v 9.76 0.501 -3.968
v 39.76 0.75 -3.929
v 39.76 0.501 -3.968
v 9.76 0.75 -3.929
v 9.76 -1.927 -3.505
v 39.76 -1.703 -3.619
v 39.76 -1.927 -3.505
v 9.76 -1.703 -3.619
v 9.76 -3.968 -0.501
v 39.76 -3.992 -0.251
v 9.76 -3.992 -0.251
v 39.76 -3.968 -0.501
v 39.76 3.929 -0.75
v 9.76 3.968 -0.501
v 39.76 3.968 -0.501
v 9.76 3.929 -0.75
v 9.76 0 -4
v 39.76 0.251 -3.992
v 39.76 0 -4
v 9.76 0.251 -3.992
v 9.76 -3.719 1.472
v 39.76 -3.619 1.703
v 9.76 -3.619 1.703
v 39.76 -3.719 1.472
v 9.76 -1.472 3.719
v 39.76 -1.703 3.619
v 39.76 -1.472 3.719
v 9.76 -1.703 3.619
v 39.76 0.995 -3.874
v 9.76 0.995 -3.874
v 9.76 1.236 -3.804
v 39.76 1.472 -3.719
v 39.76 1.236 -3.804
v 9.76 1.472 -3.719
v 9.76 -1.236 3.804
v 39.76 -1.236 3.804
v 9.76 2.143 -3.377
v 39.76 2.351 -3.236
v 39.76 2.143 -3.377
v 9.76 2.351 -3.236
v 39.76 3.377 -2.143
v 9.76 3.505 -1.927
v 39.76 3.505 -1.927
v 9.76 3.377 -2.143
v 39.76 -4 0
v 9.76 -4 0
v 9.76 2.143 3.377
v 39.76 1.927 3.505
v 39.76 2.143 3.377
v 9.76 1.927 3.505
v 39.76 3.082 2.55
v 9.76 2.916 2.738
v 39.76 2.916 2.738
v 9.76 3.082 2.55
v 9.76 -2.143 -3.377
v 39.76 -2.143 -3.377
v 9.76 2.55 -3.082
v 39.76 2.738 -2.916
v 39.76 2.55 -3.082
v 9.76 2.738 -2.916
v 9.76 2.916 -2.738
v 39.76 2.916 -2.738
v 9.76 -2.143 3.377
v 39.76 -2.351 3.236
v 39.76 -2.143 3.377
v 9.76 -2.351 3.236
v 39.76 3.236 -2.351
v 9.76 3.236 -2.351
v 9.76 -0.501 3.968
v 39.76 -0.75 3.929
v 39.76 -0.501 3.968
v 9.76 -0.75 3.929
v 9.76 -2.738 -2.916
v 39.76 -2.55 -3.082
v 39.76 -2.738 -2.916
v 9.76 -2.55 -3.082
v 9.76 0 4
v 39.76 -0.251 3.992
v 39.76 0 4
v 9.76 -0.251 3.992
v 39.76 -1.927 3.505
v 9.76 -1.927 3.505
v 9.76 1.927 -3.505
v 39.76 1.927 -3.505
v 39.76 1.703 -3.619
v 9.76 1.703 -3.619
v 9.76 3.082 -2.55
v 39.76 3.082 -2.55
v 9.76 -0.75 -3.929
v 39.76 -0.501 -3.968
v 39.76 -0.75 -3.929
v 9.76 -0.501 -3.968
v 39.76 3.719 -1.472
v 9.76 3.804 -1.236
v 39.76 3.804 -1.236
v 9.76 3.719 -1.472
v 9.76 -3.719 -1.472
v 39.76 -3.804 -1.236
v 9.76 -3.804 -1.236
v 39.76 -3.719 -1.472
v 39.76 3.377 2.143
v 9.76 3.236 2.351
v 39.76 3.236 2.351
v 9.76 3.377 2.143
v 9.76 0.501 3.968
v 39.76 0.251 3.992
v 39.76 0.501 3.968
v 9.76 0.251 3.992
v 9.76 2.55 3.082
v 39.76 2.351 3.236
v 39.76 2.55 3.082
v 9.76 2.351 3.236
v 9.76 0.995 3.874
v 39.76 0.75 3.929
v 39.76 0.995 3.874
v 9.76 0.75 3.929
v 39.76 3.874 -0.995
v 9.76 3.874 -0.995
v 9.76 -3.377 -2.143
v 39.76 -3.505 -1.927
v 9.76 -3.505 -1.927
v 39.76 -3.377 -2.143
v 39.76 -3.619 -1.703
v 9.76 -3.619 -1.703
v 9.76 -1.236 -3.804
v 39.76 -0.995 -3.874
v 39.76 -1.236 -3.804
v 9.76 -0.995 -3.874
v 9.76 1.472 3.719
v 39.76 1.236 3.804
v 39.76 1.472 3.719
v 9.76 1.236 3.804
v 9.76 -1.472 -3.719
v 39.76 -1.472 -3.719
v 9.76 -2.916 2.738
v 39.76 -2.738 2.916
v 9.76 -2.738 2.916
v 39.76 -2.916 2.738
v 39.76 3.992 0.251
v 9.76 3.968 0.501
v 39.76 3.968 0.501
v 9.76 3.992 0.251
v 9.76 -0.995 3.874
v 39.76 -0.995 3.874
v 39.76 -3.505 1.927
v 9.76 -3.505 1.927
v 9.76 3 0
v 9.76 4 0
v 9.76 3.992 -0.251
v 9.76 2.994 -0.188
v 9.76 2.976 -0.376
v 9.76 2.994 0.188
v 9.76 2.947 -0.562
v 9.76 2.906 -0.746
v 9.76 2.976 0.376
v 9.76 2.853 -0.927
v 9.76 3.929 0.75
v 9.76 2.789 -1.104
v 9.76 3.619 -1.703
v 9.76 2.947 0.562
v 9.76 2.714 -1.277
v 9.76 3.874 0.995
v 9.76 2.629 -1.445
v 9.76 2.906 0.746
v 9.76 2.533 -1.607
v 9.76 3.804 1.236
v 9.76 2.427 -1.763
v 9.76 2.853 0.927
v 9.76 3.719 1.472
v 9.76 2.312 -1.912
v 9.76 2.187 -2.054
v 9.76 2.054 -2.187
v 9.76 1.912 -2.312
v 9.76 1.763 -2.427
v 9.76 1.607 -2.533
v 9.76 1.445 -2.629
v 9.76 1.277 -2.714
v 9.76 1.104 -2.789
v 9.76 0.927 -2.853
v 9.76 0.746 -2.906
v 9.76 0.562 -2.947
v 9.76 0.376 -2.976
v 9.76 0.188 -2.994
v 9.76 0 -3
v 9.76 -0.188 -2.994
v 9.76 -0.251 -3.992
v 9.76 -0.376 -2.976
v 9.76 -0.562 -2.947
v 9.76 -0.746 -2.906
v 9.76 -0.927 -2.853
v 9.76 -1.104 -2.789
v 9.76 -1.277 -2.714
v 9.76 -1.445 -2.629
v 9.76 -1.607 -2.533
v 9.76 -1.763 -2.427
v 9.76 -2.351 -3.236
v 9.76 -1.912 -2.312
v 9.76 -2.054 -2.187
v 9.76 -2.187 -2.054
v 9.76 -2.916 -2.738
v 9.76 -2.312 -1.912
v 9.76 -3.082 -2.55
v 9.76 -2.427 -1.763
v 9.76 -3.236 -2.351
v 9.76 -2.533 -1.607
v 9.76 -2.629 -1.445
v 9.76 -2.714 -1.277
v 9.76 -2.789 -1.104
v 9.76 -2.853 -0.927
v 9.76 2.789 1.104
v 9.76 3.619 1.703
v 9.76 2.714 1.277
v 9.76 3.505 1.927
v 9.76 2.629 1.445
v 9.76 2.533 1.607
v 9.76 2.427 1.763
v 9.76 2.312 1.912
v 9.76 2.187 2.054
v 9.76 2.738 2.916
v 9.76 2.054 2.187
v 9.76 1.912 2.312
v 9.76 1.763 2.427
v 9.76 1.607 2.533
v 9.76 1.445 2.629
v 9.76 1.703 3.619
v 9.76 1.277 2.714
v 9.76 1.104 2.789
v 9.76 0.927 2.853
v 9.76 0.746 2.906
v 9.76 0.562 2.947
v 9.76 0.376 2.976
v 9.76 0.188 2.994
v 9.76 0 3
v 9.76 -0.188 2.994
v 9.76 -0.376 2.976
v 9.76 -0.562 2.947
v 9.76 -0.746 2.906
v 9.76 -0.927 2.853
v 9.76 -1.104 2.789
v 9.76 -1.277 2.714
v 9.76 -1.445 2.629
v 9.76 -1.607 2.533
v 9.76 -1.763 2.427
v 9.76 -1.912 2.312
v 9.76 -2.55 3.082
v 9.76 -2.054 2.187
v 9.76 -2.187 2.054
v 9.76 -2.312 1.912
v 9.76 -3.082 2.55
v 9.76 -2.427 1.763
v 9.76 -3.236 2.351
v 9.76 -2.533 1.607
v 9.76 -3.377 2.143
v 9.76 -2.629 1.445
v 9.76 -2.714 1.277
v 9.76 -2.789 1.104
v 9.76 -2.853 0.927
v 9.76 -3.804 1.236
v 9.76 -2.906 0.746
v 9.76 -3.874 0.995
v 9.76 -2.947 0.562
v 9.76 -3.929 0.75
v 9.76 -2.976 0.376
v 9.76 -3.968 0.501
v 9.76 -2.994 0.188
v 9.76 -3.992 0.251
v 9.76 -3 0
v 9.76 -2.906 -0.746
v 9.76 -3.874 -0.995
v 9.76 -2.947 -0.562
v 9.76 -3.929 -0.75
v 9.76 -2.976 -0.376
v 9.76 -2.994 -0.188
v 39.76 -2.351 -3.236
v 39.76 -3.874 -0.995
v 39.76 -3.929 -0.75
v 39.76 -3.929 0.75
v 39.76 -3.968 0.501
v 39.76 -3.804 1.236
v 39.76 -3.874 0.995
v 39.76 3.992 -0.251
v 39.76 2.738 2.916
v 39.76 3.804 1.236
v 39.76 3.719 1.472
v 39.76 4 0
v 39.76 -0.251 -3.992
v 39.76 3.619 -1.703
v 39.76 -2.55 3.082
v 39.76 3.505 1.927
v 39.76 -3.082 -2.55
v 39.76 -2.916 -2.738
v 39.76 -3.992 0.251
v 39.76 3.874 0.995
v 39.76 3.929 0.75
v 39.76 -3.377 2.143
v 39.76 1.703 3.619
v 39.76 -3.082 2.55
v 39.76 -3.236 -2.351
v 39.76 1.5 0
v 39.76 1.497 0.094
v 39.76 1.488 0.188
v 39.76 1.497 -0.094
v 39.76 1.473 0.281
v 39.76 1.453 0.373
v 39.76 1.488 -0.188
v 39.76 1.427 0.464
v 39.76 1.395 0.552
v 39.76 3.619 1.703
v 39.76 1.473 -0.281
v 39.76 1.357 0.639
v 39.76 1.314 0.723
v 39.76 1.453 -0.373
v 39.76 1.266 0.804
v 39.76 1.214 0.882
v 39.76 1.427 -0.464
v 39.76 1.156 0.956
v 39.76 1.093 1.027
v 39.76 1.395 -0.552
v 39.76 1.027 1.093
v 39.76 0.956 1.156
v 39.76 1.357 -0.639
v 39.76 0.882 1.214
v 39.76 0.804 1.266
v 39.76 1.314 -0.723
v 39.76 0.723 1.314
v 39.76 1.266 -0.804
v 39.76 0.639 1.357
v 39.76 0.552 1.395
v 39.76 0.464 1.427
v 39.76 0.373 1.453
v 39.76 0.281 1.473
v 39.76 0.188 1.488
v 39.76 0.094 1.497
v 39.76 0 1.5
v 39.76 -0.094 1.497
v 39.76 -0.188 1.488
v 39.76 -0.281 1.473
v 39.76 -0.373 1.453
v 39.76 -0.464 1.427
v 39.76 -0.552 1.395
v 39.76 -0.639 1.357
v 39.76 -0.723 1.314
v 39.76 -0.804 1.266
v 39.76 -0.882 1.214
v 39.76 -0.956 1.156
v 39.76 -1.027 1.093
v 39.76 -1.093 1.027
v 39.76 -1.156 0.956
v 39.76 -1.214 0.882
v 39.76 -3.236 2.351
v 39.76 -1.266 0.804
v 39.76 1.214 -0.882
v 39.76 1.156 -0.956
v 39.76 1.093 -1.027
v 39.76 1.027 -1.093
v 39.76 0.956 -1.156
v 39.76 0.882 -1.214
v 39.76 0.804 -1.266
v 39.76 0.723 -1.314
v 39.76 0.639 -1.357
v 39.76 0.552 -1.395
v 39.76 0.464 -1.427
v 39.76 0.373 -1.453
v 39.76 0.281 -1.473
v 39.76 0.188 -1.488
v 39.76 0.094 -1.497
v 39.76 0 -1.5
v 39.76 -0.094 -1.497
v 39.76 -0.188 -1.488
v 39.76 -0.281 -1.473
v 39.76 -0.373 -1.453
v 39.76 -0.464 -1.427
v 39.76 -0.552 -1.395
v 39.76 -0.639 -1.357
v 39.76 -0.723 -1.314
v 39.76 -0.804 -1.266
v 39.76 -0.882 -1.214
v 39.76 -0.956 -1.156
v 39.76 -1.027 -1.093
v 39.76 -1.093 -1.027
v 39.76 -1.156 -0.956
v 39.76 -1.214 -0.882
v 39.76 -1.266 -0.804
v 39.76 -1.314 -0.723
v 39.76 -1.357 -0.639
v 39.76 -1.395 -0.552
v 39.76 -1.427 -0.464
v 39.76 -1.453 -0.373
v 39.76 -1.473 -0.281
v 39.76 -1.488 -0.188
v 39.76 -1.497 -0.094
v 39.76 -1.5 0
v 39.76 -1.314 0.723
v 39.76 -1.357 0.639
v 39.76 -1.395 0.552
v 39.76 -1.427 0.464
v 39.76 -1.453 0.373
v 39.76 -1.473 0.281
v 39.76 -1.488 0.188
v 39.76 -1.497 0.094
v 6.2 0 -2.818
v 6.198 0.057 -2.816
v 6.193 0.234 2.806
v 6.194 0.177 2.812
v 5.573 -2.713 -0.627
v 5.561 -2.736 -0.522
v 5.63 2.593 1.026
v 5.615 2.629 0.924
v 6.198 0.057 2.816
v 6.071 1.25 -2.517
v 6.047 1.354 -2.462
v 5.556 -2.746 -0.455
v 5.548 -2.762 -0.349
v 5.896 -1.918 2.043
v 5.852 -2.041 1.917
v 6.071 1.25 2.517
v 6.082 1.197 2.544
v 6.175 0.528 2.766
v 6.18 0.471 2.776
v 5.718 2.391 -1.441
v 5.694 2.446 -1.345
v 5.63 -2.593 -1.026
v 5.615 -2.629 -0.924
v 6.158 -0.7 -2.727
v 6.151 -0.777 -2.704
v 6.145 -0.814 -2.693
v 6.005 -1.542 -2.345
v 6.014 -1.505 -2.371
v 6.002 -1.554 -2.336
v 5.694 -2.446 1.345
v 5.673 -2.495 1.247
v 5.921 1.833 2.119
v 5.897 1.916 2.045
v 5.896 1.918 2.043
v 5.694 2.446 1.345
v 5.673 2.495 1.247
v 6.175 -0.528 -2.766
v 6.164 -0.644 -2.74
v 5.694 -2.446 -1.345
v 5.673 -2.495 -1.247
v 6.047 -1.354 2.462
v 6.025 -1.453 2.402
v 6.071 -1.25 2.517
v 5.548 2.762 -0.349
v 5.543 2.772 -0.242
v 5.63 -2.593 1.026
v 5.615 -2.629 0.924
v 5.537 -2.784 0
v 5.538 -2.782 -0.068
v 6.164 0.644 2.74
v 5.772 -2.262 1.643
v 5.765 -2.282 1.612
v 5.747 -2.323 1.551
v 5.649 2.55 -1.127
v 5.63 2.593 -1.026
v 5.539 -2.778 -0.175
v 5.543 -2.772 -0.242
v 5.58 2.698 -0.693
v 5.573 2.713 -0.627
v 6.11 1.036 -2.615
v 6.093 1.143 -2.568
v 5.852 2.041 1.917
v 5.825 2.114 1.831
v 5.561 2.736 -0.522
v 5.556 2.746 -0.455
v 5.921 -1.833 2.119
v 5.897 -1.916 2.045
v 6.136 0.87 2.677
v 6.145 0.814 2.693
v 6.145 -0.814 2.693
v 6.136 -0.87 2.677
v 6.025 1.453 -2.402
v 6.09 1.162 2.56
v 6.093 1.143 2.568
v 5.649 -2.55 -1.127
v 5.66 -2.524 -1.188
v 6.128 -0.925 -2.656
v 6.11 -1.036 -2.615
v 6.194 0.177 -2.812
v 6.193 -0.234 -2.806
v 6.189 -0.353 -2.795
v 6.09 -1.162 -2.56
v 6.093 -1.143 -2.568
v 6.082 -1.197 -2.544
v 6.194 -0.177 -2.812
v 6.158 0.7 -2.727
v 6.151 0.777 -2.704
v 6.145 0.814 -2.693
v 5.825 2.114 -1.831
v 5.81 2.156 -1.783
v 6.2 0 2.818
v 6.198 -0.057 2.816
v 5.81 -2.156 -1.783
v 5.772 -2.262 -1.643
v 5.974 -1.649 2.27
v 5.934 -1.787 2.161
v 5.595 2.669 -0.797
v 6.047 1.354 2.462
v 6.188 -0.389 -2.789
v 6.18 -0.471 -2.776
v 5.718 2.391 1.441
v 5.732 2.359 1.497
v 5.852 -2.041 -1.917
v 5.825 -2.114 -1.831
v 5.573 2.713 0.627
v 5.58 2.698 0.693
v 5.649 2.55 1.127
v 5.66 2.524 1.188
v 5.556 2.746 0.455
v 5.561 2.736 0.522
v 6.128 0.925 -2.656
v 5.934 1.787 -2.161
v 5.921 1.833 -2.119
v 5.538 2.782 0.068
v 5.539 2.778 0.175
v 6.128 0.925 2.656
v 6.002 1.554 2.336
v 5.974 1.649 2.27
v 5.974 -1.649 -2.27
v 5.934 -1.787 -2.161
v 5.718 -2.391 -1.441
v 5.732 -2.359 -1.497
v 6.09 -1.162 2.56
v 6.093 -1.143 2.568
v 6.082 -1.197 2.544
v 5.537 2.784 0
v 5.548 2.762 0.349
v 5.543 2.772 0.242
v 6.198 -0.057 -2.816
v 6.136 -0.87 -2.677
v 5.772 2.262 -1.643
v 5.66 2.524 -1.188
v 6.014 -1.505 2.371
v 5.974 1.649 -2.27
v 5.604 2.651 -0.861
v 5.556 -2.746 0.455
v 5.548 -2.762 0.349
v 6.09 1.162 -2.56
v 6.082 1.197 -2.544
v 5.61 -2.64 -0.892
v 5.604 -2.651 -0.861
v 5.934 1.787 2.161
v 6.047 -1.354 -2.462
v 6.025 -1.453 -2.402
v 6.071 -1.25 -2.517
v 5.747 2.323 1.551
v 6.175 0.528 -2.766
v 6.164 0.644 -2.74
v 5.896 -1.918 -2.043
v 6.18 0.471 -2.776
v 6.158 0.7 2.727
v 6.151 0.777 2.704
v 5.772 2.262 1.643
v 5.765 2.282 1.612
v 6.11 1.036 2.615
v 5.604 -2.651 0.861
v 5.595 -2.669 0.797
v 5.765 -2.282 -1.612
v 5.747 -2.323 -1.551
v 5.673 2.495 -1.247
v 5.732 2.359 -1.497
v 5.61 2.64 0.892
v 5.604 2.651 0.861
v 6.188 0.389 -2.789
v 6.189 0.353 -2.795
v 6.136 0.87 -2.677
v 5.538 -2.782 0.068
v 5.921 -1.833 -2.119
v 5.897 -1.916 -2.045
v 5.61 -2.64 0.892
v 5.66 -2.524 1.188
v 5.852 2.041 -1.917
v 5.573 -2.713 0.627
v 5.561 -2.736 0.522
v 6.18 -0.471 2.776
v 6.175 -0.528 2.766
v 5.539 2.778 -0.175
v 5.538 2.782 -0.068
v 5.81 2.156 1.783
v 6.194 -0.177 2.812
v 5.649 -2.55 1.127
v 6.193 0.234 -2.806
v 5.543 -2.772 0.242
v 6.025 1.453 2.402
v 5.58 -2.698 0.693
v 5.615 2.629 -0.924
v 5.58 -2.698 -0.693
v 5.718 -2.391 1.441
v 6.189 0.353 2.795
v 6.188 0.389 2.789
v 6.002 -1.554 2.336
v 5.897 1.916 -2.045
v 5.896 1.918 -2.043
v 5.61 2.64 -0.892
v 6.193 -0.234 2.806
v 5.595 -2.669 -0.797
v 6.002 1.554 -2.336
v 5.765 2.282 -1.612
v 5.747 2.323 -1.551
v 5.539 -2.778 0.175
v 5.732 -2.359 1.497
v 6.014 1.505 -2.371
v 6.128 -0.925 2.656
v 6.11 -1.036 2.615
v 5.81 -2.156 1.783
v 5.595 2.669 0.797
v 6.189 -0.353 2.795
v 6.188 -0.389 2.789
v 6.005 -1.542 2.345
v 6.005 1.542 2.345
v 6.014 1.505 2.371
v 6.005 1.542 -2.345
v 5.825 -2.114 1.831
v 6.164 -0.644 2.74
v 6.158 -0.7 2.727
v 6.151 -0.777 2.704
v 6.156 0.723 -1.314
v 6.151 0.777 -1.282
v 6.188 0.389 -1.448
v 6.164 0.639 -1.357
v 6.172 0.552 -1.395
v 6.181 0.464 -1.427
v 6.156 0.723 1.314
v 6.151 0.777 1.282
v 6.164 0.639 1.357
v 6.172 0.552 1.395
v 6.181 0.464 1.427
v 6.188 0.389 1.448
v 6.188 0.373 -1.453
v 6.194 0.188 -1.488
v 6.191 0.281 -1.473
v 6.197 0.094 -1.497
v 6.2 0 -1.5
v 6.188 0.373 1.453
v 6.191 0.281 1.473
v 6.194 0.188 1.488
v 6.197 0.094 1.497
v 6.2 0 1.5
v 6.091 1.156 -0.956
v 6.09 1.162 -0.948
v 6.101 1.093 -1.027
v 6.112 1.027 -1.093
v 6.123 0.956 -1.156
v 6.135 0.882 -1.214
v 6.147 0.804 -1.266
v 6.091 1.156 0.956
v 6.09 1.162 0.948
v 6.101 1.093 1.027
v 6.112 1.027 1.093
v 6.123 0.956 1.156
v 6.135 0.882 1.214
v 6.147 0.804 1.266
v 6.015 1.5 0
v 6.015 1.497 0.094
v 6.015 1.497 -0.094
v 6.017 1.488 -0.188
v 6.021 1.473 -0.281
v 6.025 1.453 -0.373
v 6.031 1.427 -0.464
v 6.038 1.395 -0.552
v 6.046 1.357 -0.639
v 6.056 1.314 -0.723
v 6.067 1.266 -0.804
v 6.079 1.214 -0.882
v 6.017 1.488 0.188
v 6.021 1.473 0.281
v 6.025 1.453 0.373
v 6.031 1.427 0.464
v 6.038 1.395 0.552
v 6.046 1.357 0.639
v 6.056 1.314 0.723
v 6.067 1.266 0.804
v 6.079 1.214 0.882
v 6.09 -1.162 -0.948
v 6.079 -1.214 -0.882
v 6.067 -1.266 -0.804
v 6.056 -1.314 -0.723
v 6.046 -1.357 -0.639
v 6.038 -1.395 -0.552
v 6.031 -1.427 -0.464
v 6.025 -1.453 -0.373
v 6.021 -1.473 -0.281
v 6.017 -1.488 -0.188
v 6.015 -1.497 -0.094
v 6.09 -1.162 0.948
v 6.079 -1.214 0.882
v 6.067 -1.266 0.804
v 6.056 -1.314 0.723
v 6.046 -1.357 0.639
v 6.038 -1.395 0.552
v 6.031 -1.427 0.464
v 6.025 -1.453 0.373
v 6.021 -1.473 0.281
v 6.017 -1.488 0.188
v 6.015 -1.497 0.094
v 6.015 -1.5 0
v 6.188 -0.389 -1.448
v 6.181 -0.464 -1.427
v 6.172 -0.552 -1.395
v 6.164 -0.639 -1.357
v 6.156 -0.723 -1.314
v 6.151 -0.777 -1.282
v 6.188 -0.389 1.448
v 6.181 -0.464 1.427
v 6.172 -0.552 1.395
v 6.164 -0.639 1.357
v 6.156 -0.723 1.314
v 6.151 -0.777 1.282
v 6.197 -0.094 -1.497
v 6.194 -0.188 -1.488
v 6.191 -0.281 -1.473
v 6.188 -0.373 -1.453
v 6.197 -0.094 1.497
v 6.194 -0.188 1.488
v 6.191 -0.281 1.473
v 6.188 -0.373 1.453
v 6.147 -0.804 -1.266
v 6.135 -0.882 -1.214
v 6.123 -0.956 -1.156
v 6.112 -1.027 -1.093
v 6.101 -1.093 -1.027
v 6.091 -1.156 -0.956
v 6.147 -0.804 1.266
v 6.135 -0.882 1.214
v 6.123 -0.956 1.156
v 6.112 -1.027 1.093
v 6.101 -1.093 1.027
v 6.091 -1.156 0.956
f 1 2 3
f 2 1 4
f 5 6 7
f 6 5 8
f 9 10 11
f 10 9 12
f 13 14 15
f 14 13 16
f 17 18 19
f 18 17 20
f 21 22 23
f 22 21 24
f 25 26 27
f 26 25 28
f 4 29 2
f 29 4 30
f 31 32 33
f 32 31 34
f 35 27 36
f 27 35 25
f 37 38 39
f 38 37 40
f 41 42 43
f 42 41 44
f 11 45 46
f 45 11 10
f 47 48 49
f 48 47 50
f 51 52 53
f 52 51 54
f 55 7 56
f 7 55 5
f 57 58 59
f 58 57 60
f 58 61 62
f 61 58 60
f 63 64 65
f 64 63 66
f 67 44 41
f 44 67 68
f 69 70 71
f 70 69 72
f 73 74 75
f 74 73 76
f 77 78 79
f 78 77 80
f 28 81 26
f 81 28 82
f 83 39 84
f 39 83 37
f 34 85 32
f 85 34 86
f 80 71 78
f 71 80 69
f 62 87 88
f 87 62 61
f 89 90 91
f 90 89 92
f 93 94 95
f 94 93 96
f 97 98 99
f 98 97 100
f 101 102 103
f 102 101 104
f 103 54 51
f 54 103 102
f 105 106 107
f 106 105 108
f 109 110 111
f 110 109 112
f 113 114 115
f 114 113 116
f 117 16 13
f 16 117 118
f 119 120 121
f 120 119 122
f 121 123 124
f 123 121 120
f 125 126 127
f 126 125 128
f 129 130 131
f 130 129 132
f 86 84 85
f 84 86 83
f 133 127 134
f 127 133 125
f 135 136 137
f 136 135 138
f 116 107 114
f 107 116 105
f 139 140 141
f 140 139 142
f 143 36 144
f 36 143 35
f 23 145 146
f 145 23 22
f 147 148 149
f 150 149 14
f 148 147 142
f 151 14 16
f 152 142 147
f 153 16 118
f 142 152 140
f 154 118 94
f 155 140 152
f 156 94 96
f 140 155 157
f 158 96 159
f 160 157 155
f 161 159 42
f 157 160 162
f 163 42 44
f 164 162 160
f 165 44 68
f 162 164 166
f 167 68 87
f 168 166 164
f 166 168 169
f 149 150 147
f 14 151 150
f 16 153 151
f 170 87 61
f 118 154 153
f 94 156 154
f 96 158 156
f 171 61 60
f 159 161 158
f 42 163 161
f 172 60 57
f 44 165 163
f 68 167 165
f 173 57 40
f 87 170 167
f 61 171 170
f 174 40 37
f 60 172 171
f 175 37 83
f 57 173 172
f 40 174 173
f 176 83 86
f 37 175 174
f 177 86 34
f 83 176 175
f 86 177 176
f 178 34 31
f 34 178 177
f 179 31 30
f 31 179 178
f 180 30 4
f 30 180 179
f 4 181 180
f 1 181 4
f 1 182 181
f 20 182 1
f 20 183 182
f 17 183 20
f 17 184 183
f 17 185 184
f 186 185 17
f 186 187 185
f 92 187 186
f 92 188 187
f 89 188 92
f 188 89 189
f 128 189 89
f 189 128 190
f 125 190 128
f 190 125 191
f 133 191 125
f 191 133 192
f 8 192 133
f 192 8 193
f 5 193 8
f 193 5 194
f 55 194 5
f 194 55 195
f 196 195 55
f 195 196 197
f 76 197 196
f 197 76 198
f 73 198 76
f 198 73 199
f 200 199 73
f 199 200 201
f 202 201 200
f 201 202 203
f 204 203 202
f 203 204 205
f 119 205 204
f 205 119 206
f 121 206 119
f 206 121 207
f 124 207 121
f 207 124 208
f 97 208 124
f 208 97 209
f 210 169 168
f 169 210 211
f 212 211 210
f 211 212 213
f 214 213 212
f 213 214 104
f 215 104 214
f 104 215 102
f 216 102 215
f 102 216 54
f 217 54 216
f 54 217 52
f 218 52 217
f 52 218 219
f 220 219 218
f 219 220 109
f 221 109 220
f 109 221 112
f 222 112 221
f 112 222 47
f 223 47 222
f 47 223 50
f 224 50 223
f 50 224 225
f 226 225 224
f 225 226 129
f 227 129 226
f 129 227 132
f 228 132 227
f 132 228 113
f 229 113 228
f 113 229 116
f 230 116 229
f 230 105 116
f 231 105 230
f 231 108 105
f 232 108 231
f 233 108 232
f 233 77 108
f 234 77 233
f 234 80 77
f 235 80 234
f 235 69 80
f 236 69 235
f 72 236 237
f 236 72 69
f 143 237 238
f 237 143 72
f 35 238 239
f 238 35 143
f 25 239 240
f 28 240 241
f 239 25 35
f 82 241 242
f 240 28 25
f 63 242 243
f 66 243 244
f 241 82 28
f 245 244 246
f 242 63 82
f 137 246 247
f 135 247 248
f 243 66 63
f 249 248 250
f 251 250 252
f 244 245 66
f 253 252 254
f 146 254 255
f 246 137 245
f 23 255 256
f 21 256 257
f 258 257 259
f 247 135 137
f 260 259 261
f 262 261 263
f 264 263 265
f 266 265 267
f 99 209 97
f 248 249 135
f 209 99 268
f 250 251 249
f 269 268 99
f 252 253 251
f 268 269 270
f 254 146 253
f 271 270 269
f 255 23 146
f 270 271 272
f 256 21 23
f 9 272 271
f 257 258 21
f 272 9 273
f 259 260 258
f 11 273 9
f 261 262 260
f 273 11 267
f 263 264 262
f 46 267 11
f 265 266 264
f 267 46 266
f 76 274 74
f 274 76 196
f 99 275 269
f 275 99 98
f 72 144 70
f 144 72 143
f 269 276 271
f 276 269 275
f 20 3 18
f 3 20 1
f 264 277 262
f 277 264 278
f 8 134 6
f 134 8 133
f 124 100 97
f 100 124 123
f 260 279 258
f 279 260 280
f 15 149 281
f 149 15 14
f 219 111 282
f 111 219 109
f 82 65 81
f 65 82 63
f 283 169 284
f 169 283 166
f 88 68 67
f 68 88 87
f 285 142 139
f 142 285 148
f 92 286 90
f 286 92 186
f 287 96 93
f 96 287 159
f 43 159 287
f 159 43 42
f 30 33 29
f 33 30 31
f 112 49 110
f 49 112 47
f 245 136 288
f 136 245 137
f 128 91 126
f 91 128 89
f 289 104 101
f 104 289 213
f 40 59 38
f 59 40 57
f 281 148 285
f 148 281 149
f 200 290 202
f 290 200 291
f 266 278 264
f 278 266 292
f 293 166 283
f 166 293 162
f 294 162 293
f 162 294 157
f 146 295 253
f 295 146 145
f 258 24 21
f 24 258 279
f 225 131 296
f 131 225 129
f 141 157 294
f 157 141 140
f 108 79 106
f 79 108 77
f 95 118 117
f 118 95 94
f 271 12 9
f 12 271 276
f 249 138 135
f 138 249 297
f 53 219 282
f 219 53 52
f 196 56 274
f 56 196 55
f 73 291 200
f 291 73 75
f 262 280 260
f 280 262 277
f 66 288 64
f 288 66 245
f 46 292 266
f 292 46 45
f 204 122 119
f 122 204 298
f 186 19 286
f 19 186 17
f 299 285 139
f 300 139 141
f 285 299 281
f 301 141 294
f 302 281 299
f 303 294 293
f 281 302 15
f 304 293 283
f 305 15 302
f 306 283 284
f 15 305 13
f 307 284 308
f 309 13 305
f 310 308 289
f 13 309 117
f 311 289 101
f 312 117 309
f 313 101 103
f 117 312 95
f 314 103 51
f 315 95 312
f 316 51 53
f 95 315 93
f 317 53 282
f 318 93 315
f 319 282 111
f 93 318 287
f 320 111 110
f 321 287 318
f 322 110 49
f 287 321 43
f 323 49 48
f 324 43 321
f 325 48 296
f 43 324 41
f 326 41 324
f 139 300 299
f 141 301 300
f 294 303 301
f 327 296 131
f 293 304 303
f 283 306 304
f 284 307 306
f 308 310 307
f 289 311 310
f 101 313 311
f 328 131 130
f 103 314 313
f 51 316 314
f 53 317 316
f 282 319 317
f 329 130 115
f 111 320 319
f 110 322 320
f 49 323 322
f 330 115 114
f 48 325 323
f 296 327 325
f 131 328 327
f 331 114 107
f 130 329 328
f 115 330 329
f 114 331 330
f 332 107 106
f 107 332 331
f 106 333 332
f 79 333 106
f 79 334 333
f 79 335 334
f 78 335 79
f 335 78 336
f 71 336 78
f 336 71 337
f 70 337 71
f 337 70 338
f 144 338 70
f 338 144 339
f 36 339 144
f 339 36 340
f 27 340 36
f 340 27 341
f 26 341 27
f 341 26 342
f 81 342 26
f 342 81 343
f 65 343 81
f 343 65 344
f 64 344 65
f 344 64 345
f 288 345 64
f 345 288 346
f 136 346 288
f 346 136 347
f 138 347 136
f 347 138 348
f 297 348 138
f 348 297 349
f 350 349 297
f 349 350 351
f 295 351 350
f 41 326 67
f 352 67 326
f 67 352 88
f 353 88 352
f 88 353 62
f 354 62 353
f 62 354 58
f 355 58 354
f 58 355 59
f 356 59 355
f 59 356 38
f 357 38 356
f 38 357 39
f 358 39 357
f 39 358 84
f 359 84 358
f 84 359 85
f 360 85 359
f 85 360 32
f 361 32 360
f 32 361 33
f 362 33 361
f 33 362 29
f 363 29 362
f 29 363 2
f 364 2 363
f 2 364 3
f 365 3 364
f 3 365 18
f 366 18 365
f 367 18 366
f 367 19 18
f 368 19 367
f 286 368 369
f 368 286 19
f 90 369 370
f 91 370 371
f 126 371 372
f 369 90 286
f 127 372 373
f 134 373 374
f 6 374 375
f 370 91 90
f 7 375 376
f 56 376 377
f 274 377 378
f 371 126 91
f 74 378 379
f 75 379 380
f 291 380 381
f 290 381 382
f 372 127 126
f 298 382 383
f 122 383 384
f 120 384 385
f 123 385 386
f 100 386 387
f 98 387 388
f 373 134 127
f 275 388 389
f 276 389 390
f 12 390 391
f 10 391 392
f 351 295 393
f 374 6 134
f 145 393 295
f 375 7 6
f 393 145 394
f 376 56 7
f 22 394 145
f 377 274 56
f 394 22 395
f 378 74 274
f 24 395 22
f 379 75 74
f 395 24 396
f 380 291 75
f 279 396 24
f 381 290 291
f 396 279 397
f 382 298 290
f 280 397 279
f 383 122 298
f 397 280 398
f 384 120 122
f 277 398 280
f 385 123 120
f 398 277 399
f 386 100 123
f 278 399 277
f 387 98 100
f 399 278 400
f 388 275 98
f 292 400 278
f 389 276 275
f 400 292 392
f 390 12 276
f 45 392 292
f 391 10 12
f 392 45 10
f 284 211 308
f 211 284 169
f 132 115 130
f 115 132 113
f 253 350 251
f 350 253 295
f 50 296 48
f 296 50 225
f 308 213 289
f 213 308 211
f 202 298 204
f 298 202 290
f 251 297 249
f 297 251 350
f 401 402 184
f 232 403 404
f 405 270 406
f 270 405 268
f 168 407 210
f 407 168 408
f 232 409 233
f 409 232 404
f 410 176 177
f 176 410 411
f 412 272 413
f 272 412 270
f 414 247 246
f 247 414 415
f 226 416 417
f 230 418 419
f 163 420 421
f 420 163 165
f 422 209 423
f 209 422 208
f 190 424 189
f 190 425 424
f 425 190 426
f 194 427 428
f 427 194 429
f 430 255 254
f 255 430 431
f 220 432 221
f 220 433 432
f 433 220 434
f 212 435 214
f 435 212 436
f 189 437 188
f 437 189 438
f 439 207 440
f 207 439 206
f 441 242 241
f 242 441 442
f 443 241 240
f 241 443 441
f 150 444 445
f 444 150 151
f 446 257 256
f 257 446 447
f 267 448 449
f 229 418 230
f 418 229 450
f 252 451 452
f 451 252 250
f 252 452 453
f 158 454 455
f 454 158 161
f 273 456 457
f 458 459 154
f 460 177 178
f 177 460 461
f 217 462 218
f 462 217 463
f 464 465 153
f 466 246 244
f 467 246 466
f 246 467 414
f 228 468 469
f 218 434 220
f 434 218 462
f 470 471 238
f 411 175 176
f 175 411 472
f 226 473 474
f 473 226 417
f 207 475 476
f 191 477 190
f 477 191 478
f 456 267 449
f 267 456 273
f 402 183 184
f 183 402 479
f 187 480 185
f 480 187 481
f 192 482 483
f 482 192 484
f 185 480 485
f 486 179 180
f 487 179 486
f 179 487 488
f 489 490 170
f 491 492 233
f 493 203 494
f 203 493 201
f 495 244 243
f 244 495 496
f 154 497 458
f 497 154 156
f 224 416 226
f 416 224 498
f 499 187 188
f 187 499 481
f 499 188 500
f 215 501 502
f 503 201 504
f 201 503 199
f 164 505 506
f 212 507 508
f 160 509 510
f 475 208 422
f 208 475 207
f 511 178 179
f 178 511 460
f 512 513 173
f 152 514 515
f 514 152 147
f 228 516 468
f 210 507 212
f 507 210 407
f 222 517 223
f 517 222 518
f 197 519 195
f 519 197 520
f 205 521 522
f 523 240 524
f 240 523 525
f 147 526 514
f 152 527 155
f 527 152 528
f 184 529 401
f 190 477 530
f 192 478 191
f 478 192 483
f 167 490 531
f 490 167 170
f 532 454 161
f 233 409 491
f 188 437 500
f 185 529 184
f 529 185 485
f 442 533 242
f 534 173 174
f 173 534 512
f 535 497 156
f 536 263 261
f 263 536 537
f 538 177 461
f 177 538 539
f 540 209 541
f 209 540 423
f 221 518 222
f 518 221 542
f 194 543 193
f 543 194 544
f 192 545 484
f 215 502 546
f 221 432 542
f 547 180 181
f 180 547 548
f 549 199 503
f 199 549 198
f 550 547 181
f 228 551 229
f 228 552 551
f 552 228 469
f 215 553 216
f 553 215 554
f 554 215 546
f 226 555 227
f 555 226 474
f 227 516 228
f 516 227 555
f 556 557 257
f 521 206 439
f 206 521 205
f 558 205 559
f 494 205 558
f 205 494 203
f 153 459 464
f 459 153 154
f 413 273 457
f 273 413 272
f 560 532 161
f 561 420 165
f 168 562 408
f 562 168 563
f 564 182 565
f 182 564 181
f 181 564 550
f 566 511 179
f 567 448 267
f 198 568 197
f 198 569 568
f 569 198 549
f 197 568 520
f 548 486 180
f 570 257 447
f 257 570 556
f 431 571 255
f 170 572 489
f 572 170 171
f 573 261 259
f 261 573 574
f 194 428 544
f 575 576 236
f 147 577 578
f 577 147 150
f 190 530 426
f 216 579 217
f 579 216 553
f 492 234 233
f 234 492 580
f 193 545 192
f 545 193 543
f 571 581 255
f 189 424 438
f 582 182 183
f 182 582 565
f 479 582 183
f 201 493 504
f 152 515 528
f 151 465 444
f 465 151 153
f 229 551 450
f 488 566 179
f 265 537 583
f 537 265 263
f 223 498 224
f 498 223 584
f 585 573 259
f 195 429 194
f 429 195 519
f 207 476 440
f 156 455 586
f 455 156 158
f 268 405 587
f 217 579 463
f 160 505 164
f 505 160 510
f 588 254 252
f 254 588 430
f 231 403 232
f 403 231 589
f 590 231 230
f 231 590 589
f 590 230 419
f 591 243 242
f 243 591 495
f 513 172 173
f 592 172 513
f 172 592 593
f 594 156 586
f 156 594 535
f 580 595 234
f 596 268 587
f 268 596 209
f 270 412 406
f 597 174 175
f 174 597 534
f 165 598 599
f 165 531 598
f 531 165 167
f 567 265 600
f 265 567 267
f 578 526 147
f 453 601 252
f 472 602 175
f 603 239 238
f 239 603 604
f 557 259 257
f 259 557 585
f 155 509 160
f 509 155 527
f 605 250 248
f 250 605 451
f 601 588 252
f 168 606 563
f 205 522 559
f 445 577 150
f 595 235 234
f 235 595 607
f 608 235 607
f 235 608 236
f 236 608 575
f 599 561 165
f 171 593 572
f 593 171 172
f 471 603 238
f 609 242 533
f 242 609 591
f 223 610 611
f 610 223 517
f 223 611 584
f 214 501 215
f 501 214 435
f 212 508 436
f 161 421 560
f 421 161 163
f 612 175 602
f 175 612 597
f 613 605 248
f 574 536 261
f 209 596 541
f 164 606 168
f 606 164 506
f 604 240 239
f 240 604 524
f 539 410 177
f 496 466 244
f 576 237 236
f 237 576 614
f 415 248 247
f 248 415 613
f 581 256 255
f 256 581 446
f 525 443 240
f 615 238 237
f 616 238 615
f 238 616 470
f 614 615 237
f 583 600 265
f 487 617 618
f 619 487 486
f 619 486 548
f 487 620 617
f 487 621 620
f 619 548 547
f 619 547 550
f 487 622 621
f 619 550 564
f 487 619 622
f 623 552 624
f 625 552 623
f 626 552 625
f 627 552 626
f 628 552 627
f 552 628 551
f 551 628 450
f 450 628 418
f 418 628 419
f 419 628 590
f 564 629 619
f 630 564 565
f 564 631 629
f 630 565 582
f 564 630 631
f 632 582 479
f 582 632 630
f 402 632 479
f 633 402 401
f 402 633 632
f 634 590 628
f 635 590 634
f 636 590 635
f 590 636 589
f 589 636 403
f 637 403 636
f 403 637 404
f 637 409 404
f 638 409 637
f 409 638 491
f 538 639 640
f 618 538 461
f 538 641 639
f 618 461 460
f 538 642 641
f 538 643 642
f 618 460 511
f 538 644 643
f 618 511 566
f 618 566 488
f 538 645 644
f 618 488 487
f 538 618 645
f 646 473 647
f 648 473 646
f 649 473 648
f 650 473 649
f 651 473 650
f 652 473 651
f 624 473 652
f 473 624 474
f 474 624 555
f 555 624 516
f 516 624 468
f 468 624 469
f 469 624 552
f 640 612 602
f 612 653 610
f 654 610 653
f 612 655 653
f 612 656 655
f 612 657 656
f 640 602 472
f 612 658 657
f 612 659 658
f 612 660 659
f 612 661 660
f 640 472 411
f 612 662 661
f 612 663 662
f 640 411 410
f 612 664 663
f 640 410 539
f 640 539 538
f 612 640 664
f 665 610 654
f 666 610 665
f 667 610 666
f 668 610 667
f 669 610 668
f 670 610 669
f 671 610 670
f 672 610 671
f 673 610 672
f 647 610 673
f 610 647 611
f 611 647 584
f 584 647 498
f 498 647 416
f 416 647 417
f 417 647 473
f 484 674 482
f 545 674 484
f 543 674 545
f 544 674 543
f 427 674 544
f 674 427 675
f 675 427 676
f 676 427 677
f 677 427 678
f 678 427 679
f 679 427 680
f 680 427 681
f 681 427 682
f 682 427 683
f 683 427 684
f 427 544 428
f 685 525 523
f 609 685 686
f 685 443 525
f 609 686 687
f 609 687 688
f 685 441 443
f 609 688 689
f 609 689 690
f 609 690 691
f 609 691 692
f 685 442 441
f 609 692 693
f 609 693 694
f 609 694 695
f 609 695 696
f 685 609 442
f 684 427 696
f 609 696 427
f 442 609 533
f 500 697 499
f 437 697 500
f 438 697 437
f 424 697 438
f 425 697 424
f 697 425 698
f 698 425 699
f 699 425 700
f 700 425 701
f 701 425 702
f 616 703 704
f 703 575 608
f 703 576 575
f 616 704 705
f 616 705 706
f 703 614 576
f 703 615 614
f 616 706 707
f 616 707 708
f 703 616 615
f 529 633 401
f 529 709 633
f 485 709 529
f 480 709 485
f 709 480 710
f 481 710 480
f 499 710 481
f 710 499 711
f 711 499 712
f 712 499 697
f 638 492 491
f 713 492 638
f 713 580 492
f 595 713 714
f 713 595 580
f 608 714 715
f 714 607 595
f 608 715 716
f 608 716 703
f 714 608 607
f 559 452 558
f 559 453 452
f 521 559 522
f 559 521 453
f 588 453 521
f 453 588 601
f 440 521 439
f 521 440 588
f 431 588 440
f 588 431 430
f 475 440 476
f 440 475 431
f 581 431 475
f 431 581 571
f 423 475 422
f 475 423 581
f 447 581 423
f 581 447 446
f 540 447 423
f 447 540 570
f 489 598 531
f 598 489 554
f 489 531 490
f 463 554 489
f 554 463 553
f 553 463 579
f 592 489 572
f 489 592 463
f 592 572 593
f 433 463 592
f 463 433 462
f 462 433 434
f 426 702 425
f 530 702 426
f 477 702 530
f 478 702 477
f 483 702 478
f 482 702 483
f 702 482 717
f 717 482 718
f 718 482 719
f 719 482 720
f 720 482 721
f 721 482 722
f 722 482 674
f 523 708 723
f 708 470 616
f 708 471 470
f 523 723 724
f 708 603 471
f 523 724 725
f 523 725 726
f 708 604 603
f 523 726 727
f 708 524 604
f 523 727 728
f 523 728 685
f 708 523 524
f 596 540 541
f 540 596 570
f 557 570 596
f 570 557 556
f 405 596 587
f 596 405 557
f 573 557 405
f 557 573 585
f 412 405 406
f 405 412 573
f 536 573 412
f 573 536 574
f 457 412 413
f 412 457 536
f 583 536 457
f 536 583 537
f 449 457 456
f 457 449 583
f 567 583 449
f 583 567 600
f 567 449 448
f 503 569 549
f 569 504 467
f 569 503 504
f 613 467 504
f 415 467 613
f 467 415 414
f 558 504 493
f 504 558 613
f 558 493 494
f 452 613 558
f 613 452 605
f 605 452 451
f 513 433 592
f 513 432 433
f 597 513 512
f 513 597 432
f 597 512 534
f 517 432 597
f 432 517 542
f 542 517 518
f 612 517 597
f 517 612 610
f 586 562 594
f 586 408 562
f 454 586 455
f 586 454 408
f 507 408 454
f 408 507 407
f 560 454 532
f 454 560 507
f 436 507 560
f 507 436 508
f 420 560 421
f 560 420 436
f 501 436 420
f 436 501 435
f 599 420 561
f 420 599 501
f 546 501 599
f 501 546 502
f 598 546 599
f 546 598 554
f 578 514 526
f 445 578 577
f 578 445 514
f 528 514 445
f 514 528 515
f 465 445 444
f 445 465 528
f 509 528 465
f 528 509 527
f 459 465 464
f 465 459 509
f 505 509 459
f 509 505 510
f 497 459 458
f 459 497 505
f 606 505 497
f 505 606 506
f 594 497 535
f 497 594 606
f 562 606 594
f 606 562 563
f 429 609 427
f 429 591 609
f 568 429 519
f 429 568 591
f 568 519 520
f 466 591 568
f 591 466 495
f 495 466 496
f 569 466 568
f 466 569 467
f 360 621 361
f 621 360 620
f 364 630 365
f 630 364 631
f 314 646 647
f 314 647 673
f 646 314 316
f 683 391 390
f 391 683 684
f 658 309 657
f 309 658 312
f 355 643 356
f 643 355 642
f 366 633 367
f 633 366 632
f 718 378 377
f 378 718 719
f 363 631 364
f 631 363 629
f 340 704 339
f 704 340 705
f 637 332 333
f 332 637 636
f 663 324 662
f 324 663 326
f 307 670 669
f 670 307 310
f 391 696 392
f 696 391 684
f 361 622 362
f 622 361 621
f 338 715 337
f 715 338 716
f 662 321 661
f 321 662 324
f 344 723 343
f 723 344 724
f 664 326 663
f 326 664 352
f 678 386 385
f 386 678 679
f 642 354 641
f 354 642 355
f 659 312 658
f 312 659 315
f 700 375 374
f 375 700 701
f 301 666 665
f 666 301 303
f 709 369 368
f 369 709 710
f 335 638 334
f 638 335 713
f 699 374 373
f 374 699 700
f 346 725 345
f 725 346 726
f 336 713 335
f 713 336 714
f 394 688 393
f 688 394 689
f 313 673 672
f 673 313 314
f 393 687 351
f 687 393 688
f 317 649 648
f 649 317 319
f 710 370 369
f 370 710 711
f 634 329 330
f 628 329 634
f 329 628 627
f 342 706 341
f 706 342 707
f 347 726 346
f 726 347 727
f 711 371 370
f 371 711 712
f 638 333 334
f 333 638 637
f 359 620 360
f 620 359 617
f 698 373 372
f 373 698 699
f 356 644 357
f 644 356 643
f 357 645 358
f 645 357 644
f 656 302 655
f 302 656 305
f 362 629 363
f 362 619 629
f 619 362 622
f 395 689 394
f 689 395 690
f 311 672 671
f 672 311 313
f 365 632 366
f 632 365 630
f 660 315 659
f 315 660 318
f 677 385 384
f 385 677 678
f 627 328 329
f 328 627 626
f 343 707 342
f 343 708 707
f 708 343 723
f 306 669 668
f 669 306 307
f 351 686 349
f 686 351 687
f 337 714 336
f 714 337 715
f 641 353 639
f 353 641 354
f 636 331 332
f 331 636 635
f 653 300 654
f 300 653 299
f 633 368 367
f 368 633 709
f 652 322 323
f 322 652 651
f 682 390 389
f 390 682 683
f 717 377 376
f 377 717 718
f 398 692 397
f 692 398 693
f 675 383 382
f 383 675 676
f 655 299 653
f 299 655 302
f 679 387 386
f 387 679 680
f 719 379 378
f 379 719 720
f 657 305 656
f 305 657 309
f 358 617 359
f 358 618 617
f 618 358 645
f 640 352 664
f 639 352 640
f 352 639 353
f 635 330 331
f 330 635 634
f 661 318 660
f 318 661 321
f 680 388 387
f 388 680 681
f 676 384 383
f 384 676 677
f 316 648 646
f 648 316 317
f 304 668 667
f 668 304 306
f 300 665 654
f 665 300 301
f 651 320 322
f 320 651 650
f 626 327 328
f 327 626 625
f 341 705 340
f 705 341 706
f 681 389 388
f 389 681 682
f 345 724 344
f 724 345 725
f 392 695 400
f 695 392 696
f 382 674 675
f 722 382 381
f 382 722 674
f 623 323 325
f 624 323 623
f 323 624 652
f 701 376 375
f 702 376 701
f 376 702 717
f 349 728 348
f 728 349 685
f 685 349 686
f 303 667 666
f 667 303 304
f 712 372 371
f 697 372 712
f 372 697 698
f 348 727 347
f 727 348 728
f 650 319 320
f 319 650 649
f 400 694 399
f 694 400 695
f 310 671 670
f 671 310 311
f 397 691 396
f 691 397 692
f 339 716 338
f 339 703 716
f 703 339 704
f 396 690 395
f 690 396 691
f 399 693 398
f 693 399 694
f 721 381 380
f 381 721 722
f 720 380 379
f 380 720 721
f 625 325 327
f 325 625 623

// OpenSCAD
include <../lib/Getriebe.scad>;

$fn=100;

module arm_shaft() {
    margin = 0.4;
    inner_thread_diameter = 12+margin;
    gear_act = 2.23995;
    gear_edge = 12-gear_act;
    difference() {
        union() {
            translate([30/2+gear_edge, 0, 0])
            rotate([0, 90, 0])
            cylinder(r=8/2,h=30,center=true);
            translate([gear_edge/2, 0, 0])
            rotate([0, 90, 0])
            cylinder(r2=6/2,r1=5/2,h=gear_edge,center=true);
        }
        cylinder(r=inner_thread_diameter/2,h=100,center=true);
        
            translate([100/2, 0, 0])
            rotate([0, 90, 0])
            cylinder(r=3/2,h=100,center=true);
    }
}
arm_shaft();
